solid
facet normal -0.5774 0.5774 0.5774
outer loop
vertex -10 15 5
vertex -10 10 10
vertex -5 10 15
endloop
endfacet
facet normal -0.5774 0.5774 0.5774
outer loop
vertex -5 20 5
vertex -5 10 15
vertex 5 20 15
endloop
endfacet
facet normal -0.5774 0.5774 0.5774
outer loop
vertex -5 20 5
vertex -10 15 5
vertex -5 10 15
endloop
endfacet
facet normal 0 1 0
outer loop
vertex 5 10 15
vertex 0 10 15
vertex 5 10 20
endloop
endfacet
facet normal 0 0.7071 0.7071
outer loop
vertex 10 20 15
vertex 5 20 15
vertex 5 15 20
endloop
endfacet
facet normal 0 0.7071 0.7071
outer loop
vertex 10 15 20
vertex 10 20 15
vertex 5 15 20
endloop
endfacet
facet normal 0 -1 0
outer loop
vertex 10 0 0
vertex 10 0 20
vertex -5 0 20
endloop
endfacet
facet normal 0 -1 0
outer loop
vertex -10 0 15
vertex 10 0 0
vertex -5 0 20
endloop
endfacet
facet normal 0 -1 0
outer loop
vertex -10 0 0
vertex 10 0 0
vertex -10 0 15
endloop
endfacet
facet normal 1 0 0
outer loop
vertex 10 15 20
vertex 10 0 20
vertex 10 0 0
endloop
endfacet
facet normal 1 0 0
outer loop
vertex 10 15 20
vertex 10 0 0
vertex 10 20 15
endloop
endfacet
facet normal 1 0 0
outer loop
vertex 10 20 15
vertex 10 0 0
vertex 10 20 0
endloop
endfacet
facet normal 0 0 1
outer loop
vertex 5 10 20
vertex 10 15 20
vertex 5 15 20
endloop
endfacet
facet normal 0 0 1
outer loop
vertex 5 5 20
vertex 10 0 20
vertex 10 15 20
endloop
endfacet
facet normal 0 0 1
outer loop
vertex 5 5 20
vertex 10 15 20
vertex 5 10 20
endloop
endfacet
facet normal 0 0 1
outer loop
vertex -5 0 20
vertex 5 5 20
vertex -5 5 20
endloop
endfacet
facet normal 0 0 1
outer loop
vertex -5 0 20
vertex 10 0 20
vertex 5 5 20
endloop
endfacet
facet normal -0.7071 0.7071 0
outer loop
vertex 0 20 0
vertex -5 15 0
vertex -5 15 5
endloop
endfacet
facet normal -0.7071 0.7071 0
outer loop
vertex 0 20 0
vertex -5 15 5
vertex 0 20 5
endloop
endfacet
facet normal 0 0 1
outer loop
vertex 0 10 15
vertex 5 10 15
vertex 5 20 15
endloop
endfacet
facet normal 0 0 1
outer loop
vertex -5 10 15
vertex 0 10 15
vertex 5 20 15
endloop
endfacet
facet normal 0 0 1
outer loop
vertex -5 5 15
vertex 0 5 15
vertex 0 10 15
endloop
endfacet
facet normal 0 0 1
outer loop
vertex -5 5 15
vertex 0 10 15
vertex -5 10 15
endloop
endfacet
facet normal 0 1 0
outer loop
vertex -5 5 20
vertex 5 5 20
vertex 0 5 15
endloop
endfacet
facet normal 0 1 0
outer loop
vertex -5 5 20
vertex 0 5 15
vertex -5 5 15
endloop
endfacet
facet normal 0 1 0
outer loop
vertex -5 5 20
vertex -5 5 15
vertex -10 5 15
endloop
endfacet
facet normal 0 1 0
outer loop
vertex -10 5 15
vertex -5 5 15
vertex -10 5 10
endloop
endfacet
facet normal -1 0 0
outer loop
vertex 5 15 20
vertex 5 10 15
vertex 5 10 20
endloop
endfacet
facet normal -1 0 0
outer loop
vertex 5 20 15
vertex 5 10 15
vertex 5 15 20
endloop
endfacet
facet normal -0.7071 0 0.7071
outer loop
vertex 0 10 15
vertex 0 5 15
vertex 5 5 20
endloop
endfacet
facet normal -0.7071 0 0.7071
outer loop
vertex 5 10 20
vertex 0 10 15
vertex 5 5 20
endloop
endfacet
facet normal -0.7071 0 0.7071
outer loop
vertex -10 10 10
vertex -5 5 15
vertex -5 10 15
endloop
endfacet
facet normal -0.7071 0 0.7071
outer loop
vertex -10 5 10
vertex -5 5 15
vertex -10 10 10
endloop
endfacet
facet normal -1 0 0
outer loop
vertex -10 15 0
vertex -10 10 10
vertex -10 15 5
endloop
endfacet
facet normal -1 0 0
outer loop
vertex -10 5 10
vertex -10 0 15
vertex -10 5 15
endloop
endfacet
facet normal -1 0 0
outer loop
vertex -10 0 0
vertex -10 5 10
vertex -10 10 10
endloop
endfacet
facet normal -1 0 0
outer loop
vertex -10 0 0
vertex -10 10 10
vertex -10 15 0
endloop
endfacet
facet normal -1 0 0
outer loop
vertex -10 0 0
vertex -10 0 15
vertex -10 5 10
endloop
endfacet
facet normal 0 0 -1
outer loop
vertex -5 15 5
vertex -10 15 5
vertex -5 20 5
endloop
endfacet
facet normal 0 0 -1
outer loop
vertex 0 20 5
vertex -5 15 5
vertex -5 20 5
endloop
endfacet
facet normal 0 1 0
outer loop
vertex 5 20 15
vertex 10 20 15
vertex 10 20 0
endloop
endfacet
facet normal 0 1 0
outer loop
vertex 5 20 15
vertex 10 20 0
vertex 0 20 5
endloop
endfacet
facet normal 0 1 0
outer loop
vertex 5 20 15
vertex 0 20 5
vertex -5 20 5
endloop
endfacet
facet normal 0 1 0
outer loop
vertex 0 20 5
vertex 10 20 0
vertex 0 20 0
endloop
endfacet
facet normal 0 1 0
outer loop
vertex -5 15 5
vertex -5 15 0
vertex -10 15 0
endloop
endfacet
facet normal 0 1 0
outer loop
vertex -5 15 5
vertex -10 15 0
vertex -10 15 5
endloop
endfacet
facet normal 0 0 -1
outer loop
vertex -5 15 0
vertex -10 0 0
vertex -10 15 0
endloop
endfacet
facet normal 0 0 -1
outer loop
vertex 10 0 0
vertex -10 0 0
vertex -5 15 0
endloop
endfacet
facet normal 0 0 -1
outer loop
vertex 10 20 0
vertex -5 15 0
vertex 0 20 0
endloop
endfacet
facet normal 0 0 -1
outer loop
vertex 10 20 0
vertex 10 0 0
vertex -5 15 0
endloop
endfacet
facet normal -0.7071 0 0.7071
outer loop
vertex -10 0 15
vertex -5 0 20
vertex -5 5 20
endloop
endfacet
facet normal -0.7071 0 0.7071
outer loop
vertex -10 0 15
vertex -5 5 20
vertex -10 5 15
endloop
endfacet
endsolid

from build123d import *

# Parameters (mm, degrees)
BOSS_EXTRUDE2_DEPTH = 20
SKETCH3_W           = 5
SKETCH3_H           = 20
BOSS_EXTRUDE4_DEPTH = 5
CUT_EXTRUDE1_DEPTH  = 5
SKETCH5_W           = 5
SKETCH5_H           = 20
BOSS_EXTRUDE5_DEPTH = 5
CUT_EXTRUDE2_DEPTH  = 5
SKETCH7_W           = 5
SKETCH7_H           = 15
BOSS_EXTRUDE6_DEPTH = 5
BOSS_EXTRUDE7_DEPTH = 20
CUT_EXTRUDE3_DEPTH  = 20
BOSS_EXTRUDE8_DEPTH = 5
BOSS_EXTRUDE9_DEPTH = 5


with BuildPart() as part:
    # Sketch2 → Boss-Extrude2 (new body)
    with BuildSketch(Plane(origin=(0, 0, 0), x_dir=(1, 0, 0), z_dir=(0, 1, 0))):
        Polygon((0, 0), (10, 0), (10, -15), (5, -15), (-5, -5), (0, -5), align=None)
    extrude(amount=BOSS_EXTRUDE2_DEPTH)

    # Sketch3 → Boss-Extrude4 (add)
    with BuildSketch(Plane.XY.offset(15)):
        with Locations((7.5, 10)):
            Rectangle(SKETCH3_W, SKETCH3_H)
    extrude(amount=BOSS_EXTRUDE4_DEPTH)

    # Sketch4 → Cut-Extrude1 (cut)
    with BuildSketch(Plane.ZY.offset(-5)):
        Polygon((15, 20), (20, 15), (20, 20), align=None)
    extrude(amount=-CUT_EXTRUDE1_DEPTH, mode=Mode.SUBTRACT)

    # Sketch5 → Boss-Extrude5 (add)
    with BuildSketch(Plane.ZY):
        with Locations((2.5, 10)):
            Rectangle(SKETCH5_W, SKETCH5_H)
    extrude(amount=BOSS_EXTRUDE5_DEPTH)

    # Sketch6 → Cut-Extrude2 (cut)
    with BuildSketch(Plane(origin=(0, 0, 0), x_dir=(-1, 0, 0), z_dir=(0, 0, -1))):
        Polygon((0, 20), (5, 20), (5, 15), align=None)
    extrude(amount=-CUT_EXTRUDE2_DEPTH, mode=Mode.SUBTRACT)

    # Sketch7 → Boss-Extrude6 (add)
    with BuildSketch(Plane.ZY.offset(5)):
        with Locations((2.5, 7.5)):
            Rectangle(SKETCH7_W, SKETCH7_H)
    extrude(amount=BOSS_EXTRUDE6_DEPTH)

    # Sketch8 → Boss-Extrude7 (add)
    with BuildSketch(Plane(origin=(0, 0, 0), x_dir=(-1, 0, 0), z_dir=(0, -1, 0))):
        Polygon((10, -5), (5, -5), (-5, -15), (5, -15), (10, -10), align=None)
    extrude(amount=-BOSS_EXTRUDE7_DEPTH)

    # 3DSketch1 → Cut-Extrude3 (cut, along a direction that is not the sketch's normal)
    with BuildSketch(Plane(origin=(-5, 10, 15), x_dir=(0.7071067811865476, 0.7071067811865476, 0), z_dir=(-0.5773502691896257, 0.5773502691896257, 0.577350269189626))):
        Polygon((0, 0), (14.142135624, 0), (7.071067812, 12.247448714), (0, 12.247448714), (-3.535533906, 6.123724357), align=None)
    extrude(amount=CUT_EXTRUDE3_DEPTH, dir=(0, 1, 0), mode=Mode.SUBTRACT)

    # Sketch9 → Boss-Extrude8 (add)
    with BuildSketch(Plane(origin=(0, 0, 0), x_dir=(-1, 0, 0), z_dir=(0, -1, 0))):
        Polygon((5, -20), (10, -15), (10, -10), (5, -15), (-5, -15), (-5, -20), align=None)
    extrude(amount=-BOSS_EXTRUDE8_DEPTH)

    # Sketch10 → Boss-Extrude9 (add)
    with BuildSketch(Plane(origin=(0, 5, 0), x_dir=(1, 0, 0), z_dir=(0, 1, 0))):
        Polygon((0, -15), (5, -20), (5, -15), align=None)
    extrude(amount=BOSS_EXTRUDE9_DEPTH)


solid = part.part
